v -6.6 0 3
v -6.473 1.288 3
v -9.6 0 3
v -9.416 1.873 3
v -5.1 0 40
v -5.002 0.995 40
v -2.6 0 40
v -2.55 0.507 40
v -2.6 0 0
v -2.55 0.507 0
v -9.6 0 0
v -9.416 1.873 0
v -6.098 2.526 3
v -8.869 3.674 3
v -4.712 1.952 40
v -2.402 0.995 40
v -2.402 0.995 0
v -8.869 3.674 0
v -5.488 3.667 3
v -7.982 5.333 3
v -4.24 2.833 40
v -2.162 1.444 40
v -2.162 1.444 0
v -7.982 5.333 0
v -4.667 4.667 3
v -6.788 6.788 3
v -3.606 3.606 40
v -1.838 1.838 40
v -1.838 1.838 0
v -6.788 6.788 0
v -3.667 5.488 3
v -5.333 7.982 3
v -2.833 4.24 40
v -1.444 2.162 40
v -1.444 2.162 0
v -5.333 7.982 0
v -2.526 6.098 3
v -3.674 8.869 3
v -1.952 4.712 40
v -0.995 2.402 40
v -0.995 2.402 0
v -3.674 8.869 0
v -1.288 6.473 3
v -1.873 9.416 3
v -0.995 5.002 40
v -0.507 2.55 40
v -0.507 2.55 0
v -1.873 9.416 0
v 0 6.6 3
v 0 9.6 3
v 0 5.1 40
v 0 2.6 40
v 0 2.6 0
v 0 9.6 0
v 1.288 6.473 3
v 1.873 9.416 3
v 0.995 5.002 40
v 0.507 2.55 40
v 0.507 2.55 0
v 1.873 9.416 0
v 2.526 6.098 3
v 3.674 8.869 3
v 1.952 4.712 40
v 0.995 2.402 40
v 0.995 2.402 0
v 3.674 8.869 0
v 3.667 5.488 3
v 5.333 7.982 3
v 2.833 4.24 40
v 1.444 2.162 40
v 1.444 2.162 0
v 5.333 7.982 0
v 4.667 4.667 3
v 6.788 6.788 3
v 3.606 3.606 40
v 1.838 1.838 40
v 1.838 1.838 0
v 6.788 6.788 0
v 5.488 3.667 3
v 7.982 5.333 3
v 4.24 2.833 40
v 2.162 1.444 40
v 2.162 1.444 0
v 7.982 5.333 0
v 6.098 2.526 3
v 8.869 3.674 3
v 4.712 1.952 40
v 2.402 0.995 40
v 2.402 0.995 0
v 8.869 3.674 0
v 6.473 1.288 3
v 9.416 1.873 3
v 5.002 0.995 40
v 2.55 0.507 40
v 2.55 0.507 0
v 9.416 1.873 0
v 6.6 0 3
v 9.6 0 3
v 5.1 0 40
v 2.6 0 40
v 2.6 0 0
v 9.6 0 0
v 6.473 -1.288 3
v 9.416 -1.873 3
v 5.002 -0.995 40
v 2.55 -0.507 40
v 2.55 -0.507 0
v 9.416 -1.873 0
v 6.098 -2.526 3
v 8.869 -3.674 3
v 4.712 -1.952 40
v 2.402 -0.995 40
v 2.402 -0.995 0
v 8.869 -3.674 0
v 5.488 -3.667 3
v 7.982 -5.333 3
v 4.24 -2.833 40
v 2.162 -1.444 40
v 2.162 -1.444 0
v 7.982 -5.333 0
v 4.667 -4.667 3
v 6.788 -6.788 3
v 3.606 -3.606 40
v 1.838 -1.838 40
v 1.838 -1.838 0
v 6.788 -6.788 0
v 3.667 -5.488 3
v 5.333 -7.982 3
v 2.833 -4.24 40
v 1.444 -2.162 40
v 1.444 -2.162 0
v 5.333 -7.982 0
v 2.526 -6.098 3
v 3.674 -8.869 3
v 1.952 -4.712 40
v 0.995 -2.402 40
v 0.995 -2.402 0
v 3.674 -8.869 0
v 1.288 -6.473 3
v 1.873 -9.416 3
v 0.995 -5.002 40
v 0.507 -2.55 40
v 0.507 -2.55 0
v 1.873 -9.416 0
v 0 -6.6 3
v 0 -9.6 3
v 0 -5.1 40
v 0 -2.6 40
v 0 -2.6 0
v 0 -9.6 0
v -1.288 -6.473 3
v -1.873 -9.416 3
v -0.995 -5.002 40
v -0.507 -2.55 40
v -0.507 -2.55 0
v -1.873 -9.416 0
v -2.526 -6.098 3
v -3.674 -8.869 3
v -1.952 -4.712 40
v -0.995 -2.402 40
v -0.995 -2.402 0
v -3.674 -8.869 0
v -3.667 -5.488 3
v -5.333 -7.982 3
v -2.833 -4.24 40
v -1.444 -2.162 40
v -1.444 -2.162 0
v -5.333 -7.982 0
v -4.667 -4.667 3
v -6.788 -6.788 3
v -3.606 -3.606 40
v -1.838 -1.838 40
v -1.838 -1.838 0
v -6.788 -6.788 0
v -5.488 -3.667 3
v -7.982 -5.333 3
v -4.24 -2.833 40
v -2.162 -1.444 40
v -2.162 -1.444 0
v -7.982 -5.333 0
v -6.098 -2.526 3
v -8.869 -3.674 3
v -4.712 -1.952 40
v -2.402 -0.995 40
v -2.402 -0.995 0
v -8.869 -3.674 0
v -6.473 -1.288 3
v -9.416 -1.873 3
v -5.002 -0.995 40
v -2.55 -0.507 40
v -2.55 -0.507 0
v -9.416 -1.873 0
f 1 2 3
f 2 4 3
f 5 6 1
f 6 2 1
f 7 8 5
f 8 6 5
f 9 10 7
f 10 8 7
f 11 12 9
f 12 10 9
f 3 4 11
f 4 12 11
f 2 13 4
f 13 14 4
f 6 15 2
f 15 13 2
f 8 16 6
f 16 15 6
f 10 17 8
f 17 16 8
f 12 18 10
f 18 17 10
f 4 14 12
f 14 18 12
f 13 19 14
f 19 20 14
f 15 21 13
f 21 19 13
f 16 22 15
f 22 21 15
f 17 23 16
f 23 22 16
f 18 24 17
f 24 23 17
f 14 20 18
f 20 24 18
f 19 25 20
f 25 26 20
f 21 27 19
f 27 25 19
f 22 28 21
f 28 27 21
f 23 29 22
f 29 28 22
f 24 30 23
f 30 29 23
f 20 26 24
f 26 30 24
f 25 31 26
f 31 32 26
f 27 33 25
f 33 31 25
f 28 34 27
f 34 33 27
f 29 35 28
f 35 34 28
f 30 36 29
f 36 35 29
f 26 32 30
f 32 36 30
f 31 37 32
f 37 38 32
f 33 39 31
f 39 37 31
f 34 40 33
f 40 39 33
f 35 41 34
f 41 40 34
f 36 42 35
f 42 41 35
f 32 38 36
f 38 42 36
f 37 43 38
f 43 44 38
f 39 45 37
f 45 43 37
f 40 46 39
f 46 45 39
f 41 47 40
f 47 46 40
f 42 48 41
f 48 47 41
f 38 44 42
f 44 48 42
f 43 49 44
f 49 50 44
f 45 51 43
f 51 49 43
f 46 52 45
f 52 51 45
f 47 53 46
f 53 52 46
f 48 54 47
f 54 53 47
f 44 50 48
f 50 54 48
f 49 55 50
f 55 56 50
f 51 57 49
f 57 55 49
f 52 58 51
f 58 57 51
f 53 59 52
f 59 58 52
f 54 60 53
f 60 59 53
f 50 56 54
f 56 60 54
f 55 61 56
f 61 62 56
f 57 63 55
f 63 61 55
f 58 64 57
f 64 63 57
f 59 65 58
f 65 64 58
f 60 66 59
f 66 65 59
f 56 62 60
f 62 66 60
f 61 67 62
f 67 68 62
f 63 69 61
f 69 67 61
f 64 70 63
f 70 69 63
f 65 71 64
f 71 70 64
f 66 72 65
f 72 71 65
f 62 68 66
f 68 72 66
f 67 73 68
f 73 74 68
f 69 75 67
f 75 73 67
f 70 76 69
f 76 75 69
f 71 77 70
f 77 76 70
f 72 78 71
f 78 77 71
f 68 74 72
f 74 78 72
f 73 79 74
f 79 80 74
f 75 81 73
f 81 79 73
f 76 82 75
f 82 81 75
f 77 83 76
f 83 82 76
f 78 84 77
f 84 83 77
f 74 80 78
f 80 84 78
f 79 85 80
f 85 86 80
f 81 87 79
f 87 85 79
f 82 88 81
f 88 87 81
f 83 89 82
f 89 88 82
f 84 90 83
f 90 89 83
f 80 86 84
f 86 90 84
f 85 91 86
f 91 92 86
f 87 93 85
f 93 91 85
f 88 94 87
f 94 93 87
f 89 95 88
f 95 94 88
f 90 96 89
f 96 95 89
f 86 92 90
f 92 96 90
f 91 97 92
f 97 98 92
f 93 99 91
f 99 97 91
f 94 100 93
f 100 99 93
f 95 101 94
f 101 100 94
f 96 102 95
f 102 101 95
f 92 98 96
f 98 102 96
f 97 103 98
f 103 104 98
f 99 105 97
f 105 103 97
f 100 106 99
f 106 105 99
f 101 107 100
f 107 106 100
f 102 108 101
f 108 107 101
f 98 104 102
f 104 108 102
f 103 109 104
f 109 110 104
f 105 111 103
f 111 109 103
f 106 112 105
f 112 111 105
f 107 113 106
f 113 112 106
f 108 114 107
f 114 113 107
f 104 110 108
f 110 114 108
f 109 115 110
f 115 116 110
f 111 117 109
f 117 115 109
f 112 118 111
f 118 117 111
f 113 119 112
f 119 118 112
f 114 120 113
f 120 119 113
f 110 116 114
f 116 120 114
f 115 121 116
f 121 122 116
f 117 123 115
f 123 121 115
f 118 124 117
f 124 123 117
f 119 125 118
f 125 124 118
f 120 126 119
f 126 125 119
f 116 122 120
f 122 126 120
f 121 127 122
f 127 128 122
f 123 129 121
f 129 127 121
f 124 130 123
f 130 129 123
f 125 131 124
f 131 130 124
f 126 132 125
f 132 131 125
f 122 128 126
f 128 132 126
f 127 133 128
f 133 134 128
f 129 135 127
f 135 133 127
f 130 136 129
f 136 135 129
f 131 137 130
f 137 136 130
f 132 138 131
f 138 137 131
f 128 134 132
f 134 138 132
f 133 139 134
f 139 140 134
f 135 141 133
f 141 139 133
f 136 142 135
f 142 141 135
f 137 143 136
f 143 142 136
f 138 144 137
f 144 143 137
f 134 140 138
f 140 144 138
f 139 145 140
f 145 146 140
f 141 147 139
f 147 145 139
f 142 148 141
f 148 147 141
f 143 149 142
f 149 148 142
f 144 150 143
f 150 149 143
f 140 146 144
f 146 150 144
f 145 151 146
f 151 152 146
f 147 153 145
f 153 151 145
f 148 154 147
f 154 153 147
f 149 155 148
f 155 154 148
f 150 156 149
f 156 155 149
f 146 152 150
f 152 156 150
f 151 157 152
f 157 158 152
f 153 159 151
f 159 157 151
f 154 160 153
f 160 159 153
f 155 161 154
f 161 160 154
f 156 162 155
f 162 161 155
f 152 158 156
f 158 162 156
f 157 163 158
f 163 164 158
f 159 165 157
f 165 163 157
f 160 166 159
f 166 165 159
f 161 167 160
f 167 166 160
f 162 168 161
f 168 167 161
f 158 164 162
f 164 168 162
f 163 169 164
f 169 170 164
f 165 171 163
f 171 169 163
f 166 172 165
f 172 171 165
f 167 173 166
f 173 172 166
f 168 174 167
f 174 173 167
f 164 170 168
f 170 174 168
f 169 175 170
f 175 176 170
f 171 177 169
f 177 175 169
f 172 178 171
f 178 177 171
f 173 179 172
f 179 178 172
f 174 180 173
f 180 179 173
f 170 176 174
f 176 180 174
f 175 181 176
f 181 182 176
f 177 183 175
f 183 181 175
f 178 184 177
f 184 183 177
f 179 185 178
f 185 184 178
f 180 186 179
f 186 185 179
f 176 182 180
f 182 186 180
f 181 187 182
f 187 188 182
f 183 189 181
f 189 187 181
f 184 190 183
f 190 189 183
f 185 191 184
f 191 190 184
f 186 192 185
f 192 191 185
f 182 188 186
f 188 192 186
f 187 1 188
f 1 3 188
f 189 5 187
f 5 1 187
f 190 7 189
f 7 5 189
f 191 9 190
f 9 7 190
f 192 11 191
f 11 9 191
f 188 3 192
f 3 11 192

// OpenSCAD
$fn = 32;

// ----------------------------------------------------------------------
// Profiled standoff: conical spacer, 40 mm long, bore 5.2 mm
// ----------------------------------------------------------------------

// --- parameters (mm) ---
revolve_angle = 360;      // full turn around the Z axis
profile_points = 6;       // points of the closed outline

profile = [[2.6, 0], [9.6, 0], [9.6, 3], [6.6, 3], [5.1, 40], [2.6, 40]];  // single closed polygon, 6 points, counter clockwise

// --- the one profile operation ---
rotate_extrude(angle = revolve_angle) polygon(points = profile);
